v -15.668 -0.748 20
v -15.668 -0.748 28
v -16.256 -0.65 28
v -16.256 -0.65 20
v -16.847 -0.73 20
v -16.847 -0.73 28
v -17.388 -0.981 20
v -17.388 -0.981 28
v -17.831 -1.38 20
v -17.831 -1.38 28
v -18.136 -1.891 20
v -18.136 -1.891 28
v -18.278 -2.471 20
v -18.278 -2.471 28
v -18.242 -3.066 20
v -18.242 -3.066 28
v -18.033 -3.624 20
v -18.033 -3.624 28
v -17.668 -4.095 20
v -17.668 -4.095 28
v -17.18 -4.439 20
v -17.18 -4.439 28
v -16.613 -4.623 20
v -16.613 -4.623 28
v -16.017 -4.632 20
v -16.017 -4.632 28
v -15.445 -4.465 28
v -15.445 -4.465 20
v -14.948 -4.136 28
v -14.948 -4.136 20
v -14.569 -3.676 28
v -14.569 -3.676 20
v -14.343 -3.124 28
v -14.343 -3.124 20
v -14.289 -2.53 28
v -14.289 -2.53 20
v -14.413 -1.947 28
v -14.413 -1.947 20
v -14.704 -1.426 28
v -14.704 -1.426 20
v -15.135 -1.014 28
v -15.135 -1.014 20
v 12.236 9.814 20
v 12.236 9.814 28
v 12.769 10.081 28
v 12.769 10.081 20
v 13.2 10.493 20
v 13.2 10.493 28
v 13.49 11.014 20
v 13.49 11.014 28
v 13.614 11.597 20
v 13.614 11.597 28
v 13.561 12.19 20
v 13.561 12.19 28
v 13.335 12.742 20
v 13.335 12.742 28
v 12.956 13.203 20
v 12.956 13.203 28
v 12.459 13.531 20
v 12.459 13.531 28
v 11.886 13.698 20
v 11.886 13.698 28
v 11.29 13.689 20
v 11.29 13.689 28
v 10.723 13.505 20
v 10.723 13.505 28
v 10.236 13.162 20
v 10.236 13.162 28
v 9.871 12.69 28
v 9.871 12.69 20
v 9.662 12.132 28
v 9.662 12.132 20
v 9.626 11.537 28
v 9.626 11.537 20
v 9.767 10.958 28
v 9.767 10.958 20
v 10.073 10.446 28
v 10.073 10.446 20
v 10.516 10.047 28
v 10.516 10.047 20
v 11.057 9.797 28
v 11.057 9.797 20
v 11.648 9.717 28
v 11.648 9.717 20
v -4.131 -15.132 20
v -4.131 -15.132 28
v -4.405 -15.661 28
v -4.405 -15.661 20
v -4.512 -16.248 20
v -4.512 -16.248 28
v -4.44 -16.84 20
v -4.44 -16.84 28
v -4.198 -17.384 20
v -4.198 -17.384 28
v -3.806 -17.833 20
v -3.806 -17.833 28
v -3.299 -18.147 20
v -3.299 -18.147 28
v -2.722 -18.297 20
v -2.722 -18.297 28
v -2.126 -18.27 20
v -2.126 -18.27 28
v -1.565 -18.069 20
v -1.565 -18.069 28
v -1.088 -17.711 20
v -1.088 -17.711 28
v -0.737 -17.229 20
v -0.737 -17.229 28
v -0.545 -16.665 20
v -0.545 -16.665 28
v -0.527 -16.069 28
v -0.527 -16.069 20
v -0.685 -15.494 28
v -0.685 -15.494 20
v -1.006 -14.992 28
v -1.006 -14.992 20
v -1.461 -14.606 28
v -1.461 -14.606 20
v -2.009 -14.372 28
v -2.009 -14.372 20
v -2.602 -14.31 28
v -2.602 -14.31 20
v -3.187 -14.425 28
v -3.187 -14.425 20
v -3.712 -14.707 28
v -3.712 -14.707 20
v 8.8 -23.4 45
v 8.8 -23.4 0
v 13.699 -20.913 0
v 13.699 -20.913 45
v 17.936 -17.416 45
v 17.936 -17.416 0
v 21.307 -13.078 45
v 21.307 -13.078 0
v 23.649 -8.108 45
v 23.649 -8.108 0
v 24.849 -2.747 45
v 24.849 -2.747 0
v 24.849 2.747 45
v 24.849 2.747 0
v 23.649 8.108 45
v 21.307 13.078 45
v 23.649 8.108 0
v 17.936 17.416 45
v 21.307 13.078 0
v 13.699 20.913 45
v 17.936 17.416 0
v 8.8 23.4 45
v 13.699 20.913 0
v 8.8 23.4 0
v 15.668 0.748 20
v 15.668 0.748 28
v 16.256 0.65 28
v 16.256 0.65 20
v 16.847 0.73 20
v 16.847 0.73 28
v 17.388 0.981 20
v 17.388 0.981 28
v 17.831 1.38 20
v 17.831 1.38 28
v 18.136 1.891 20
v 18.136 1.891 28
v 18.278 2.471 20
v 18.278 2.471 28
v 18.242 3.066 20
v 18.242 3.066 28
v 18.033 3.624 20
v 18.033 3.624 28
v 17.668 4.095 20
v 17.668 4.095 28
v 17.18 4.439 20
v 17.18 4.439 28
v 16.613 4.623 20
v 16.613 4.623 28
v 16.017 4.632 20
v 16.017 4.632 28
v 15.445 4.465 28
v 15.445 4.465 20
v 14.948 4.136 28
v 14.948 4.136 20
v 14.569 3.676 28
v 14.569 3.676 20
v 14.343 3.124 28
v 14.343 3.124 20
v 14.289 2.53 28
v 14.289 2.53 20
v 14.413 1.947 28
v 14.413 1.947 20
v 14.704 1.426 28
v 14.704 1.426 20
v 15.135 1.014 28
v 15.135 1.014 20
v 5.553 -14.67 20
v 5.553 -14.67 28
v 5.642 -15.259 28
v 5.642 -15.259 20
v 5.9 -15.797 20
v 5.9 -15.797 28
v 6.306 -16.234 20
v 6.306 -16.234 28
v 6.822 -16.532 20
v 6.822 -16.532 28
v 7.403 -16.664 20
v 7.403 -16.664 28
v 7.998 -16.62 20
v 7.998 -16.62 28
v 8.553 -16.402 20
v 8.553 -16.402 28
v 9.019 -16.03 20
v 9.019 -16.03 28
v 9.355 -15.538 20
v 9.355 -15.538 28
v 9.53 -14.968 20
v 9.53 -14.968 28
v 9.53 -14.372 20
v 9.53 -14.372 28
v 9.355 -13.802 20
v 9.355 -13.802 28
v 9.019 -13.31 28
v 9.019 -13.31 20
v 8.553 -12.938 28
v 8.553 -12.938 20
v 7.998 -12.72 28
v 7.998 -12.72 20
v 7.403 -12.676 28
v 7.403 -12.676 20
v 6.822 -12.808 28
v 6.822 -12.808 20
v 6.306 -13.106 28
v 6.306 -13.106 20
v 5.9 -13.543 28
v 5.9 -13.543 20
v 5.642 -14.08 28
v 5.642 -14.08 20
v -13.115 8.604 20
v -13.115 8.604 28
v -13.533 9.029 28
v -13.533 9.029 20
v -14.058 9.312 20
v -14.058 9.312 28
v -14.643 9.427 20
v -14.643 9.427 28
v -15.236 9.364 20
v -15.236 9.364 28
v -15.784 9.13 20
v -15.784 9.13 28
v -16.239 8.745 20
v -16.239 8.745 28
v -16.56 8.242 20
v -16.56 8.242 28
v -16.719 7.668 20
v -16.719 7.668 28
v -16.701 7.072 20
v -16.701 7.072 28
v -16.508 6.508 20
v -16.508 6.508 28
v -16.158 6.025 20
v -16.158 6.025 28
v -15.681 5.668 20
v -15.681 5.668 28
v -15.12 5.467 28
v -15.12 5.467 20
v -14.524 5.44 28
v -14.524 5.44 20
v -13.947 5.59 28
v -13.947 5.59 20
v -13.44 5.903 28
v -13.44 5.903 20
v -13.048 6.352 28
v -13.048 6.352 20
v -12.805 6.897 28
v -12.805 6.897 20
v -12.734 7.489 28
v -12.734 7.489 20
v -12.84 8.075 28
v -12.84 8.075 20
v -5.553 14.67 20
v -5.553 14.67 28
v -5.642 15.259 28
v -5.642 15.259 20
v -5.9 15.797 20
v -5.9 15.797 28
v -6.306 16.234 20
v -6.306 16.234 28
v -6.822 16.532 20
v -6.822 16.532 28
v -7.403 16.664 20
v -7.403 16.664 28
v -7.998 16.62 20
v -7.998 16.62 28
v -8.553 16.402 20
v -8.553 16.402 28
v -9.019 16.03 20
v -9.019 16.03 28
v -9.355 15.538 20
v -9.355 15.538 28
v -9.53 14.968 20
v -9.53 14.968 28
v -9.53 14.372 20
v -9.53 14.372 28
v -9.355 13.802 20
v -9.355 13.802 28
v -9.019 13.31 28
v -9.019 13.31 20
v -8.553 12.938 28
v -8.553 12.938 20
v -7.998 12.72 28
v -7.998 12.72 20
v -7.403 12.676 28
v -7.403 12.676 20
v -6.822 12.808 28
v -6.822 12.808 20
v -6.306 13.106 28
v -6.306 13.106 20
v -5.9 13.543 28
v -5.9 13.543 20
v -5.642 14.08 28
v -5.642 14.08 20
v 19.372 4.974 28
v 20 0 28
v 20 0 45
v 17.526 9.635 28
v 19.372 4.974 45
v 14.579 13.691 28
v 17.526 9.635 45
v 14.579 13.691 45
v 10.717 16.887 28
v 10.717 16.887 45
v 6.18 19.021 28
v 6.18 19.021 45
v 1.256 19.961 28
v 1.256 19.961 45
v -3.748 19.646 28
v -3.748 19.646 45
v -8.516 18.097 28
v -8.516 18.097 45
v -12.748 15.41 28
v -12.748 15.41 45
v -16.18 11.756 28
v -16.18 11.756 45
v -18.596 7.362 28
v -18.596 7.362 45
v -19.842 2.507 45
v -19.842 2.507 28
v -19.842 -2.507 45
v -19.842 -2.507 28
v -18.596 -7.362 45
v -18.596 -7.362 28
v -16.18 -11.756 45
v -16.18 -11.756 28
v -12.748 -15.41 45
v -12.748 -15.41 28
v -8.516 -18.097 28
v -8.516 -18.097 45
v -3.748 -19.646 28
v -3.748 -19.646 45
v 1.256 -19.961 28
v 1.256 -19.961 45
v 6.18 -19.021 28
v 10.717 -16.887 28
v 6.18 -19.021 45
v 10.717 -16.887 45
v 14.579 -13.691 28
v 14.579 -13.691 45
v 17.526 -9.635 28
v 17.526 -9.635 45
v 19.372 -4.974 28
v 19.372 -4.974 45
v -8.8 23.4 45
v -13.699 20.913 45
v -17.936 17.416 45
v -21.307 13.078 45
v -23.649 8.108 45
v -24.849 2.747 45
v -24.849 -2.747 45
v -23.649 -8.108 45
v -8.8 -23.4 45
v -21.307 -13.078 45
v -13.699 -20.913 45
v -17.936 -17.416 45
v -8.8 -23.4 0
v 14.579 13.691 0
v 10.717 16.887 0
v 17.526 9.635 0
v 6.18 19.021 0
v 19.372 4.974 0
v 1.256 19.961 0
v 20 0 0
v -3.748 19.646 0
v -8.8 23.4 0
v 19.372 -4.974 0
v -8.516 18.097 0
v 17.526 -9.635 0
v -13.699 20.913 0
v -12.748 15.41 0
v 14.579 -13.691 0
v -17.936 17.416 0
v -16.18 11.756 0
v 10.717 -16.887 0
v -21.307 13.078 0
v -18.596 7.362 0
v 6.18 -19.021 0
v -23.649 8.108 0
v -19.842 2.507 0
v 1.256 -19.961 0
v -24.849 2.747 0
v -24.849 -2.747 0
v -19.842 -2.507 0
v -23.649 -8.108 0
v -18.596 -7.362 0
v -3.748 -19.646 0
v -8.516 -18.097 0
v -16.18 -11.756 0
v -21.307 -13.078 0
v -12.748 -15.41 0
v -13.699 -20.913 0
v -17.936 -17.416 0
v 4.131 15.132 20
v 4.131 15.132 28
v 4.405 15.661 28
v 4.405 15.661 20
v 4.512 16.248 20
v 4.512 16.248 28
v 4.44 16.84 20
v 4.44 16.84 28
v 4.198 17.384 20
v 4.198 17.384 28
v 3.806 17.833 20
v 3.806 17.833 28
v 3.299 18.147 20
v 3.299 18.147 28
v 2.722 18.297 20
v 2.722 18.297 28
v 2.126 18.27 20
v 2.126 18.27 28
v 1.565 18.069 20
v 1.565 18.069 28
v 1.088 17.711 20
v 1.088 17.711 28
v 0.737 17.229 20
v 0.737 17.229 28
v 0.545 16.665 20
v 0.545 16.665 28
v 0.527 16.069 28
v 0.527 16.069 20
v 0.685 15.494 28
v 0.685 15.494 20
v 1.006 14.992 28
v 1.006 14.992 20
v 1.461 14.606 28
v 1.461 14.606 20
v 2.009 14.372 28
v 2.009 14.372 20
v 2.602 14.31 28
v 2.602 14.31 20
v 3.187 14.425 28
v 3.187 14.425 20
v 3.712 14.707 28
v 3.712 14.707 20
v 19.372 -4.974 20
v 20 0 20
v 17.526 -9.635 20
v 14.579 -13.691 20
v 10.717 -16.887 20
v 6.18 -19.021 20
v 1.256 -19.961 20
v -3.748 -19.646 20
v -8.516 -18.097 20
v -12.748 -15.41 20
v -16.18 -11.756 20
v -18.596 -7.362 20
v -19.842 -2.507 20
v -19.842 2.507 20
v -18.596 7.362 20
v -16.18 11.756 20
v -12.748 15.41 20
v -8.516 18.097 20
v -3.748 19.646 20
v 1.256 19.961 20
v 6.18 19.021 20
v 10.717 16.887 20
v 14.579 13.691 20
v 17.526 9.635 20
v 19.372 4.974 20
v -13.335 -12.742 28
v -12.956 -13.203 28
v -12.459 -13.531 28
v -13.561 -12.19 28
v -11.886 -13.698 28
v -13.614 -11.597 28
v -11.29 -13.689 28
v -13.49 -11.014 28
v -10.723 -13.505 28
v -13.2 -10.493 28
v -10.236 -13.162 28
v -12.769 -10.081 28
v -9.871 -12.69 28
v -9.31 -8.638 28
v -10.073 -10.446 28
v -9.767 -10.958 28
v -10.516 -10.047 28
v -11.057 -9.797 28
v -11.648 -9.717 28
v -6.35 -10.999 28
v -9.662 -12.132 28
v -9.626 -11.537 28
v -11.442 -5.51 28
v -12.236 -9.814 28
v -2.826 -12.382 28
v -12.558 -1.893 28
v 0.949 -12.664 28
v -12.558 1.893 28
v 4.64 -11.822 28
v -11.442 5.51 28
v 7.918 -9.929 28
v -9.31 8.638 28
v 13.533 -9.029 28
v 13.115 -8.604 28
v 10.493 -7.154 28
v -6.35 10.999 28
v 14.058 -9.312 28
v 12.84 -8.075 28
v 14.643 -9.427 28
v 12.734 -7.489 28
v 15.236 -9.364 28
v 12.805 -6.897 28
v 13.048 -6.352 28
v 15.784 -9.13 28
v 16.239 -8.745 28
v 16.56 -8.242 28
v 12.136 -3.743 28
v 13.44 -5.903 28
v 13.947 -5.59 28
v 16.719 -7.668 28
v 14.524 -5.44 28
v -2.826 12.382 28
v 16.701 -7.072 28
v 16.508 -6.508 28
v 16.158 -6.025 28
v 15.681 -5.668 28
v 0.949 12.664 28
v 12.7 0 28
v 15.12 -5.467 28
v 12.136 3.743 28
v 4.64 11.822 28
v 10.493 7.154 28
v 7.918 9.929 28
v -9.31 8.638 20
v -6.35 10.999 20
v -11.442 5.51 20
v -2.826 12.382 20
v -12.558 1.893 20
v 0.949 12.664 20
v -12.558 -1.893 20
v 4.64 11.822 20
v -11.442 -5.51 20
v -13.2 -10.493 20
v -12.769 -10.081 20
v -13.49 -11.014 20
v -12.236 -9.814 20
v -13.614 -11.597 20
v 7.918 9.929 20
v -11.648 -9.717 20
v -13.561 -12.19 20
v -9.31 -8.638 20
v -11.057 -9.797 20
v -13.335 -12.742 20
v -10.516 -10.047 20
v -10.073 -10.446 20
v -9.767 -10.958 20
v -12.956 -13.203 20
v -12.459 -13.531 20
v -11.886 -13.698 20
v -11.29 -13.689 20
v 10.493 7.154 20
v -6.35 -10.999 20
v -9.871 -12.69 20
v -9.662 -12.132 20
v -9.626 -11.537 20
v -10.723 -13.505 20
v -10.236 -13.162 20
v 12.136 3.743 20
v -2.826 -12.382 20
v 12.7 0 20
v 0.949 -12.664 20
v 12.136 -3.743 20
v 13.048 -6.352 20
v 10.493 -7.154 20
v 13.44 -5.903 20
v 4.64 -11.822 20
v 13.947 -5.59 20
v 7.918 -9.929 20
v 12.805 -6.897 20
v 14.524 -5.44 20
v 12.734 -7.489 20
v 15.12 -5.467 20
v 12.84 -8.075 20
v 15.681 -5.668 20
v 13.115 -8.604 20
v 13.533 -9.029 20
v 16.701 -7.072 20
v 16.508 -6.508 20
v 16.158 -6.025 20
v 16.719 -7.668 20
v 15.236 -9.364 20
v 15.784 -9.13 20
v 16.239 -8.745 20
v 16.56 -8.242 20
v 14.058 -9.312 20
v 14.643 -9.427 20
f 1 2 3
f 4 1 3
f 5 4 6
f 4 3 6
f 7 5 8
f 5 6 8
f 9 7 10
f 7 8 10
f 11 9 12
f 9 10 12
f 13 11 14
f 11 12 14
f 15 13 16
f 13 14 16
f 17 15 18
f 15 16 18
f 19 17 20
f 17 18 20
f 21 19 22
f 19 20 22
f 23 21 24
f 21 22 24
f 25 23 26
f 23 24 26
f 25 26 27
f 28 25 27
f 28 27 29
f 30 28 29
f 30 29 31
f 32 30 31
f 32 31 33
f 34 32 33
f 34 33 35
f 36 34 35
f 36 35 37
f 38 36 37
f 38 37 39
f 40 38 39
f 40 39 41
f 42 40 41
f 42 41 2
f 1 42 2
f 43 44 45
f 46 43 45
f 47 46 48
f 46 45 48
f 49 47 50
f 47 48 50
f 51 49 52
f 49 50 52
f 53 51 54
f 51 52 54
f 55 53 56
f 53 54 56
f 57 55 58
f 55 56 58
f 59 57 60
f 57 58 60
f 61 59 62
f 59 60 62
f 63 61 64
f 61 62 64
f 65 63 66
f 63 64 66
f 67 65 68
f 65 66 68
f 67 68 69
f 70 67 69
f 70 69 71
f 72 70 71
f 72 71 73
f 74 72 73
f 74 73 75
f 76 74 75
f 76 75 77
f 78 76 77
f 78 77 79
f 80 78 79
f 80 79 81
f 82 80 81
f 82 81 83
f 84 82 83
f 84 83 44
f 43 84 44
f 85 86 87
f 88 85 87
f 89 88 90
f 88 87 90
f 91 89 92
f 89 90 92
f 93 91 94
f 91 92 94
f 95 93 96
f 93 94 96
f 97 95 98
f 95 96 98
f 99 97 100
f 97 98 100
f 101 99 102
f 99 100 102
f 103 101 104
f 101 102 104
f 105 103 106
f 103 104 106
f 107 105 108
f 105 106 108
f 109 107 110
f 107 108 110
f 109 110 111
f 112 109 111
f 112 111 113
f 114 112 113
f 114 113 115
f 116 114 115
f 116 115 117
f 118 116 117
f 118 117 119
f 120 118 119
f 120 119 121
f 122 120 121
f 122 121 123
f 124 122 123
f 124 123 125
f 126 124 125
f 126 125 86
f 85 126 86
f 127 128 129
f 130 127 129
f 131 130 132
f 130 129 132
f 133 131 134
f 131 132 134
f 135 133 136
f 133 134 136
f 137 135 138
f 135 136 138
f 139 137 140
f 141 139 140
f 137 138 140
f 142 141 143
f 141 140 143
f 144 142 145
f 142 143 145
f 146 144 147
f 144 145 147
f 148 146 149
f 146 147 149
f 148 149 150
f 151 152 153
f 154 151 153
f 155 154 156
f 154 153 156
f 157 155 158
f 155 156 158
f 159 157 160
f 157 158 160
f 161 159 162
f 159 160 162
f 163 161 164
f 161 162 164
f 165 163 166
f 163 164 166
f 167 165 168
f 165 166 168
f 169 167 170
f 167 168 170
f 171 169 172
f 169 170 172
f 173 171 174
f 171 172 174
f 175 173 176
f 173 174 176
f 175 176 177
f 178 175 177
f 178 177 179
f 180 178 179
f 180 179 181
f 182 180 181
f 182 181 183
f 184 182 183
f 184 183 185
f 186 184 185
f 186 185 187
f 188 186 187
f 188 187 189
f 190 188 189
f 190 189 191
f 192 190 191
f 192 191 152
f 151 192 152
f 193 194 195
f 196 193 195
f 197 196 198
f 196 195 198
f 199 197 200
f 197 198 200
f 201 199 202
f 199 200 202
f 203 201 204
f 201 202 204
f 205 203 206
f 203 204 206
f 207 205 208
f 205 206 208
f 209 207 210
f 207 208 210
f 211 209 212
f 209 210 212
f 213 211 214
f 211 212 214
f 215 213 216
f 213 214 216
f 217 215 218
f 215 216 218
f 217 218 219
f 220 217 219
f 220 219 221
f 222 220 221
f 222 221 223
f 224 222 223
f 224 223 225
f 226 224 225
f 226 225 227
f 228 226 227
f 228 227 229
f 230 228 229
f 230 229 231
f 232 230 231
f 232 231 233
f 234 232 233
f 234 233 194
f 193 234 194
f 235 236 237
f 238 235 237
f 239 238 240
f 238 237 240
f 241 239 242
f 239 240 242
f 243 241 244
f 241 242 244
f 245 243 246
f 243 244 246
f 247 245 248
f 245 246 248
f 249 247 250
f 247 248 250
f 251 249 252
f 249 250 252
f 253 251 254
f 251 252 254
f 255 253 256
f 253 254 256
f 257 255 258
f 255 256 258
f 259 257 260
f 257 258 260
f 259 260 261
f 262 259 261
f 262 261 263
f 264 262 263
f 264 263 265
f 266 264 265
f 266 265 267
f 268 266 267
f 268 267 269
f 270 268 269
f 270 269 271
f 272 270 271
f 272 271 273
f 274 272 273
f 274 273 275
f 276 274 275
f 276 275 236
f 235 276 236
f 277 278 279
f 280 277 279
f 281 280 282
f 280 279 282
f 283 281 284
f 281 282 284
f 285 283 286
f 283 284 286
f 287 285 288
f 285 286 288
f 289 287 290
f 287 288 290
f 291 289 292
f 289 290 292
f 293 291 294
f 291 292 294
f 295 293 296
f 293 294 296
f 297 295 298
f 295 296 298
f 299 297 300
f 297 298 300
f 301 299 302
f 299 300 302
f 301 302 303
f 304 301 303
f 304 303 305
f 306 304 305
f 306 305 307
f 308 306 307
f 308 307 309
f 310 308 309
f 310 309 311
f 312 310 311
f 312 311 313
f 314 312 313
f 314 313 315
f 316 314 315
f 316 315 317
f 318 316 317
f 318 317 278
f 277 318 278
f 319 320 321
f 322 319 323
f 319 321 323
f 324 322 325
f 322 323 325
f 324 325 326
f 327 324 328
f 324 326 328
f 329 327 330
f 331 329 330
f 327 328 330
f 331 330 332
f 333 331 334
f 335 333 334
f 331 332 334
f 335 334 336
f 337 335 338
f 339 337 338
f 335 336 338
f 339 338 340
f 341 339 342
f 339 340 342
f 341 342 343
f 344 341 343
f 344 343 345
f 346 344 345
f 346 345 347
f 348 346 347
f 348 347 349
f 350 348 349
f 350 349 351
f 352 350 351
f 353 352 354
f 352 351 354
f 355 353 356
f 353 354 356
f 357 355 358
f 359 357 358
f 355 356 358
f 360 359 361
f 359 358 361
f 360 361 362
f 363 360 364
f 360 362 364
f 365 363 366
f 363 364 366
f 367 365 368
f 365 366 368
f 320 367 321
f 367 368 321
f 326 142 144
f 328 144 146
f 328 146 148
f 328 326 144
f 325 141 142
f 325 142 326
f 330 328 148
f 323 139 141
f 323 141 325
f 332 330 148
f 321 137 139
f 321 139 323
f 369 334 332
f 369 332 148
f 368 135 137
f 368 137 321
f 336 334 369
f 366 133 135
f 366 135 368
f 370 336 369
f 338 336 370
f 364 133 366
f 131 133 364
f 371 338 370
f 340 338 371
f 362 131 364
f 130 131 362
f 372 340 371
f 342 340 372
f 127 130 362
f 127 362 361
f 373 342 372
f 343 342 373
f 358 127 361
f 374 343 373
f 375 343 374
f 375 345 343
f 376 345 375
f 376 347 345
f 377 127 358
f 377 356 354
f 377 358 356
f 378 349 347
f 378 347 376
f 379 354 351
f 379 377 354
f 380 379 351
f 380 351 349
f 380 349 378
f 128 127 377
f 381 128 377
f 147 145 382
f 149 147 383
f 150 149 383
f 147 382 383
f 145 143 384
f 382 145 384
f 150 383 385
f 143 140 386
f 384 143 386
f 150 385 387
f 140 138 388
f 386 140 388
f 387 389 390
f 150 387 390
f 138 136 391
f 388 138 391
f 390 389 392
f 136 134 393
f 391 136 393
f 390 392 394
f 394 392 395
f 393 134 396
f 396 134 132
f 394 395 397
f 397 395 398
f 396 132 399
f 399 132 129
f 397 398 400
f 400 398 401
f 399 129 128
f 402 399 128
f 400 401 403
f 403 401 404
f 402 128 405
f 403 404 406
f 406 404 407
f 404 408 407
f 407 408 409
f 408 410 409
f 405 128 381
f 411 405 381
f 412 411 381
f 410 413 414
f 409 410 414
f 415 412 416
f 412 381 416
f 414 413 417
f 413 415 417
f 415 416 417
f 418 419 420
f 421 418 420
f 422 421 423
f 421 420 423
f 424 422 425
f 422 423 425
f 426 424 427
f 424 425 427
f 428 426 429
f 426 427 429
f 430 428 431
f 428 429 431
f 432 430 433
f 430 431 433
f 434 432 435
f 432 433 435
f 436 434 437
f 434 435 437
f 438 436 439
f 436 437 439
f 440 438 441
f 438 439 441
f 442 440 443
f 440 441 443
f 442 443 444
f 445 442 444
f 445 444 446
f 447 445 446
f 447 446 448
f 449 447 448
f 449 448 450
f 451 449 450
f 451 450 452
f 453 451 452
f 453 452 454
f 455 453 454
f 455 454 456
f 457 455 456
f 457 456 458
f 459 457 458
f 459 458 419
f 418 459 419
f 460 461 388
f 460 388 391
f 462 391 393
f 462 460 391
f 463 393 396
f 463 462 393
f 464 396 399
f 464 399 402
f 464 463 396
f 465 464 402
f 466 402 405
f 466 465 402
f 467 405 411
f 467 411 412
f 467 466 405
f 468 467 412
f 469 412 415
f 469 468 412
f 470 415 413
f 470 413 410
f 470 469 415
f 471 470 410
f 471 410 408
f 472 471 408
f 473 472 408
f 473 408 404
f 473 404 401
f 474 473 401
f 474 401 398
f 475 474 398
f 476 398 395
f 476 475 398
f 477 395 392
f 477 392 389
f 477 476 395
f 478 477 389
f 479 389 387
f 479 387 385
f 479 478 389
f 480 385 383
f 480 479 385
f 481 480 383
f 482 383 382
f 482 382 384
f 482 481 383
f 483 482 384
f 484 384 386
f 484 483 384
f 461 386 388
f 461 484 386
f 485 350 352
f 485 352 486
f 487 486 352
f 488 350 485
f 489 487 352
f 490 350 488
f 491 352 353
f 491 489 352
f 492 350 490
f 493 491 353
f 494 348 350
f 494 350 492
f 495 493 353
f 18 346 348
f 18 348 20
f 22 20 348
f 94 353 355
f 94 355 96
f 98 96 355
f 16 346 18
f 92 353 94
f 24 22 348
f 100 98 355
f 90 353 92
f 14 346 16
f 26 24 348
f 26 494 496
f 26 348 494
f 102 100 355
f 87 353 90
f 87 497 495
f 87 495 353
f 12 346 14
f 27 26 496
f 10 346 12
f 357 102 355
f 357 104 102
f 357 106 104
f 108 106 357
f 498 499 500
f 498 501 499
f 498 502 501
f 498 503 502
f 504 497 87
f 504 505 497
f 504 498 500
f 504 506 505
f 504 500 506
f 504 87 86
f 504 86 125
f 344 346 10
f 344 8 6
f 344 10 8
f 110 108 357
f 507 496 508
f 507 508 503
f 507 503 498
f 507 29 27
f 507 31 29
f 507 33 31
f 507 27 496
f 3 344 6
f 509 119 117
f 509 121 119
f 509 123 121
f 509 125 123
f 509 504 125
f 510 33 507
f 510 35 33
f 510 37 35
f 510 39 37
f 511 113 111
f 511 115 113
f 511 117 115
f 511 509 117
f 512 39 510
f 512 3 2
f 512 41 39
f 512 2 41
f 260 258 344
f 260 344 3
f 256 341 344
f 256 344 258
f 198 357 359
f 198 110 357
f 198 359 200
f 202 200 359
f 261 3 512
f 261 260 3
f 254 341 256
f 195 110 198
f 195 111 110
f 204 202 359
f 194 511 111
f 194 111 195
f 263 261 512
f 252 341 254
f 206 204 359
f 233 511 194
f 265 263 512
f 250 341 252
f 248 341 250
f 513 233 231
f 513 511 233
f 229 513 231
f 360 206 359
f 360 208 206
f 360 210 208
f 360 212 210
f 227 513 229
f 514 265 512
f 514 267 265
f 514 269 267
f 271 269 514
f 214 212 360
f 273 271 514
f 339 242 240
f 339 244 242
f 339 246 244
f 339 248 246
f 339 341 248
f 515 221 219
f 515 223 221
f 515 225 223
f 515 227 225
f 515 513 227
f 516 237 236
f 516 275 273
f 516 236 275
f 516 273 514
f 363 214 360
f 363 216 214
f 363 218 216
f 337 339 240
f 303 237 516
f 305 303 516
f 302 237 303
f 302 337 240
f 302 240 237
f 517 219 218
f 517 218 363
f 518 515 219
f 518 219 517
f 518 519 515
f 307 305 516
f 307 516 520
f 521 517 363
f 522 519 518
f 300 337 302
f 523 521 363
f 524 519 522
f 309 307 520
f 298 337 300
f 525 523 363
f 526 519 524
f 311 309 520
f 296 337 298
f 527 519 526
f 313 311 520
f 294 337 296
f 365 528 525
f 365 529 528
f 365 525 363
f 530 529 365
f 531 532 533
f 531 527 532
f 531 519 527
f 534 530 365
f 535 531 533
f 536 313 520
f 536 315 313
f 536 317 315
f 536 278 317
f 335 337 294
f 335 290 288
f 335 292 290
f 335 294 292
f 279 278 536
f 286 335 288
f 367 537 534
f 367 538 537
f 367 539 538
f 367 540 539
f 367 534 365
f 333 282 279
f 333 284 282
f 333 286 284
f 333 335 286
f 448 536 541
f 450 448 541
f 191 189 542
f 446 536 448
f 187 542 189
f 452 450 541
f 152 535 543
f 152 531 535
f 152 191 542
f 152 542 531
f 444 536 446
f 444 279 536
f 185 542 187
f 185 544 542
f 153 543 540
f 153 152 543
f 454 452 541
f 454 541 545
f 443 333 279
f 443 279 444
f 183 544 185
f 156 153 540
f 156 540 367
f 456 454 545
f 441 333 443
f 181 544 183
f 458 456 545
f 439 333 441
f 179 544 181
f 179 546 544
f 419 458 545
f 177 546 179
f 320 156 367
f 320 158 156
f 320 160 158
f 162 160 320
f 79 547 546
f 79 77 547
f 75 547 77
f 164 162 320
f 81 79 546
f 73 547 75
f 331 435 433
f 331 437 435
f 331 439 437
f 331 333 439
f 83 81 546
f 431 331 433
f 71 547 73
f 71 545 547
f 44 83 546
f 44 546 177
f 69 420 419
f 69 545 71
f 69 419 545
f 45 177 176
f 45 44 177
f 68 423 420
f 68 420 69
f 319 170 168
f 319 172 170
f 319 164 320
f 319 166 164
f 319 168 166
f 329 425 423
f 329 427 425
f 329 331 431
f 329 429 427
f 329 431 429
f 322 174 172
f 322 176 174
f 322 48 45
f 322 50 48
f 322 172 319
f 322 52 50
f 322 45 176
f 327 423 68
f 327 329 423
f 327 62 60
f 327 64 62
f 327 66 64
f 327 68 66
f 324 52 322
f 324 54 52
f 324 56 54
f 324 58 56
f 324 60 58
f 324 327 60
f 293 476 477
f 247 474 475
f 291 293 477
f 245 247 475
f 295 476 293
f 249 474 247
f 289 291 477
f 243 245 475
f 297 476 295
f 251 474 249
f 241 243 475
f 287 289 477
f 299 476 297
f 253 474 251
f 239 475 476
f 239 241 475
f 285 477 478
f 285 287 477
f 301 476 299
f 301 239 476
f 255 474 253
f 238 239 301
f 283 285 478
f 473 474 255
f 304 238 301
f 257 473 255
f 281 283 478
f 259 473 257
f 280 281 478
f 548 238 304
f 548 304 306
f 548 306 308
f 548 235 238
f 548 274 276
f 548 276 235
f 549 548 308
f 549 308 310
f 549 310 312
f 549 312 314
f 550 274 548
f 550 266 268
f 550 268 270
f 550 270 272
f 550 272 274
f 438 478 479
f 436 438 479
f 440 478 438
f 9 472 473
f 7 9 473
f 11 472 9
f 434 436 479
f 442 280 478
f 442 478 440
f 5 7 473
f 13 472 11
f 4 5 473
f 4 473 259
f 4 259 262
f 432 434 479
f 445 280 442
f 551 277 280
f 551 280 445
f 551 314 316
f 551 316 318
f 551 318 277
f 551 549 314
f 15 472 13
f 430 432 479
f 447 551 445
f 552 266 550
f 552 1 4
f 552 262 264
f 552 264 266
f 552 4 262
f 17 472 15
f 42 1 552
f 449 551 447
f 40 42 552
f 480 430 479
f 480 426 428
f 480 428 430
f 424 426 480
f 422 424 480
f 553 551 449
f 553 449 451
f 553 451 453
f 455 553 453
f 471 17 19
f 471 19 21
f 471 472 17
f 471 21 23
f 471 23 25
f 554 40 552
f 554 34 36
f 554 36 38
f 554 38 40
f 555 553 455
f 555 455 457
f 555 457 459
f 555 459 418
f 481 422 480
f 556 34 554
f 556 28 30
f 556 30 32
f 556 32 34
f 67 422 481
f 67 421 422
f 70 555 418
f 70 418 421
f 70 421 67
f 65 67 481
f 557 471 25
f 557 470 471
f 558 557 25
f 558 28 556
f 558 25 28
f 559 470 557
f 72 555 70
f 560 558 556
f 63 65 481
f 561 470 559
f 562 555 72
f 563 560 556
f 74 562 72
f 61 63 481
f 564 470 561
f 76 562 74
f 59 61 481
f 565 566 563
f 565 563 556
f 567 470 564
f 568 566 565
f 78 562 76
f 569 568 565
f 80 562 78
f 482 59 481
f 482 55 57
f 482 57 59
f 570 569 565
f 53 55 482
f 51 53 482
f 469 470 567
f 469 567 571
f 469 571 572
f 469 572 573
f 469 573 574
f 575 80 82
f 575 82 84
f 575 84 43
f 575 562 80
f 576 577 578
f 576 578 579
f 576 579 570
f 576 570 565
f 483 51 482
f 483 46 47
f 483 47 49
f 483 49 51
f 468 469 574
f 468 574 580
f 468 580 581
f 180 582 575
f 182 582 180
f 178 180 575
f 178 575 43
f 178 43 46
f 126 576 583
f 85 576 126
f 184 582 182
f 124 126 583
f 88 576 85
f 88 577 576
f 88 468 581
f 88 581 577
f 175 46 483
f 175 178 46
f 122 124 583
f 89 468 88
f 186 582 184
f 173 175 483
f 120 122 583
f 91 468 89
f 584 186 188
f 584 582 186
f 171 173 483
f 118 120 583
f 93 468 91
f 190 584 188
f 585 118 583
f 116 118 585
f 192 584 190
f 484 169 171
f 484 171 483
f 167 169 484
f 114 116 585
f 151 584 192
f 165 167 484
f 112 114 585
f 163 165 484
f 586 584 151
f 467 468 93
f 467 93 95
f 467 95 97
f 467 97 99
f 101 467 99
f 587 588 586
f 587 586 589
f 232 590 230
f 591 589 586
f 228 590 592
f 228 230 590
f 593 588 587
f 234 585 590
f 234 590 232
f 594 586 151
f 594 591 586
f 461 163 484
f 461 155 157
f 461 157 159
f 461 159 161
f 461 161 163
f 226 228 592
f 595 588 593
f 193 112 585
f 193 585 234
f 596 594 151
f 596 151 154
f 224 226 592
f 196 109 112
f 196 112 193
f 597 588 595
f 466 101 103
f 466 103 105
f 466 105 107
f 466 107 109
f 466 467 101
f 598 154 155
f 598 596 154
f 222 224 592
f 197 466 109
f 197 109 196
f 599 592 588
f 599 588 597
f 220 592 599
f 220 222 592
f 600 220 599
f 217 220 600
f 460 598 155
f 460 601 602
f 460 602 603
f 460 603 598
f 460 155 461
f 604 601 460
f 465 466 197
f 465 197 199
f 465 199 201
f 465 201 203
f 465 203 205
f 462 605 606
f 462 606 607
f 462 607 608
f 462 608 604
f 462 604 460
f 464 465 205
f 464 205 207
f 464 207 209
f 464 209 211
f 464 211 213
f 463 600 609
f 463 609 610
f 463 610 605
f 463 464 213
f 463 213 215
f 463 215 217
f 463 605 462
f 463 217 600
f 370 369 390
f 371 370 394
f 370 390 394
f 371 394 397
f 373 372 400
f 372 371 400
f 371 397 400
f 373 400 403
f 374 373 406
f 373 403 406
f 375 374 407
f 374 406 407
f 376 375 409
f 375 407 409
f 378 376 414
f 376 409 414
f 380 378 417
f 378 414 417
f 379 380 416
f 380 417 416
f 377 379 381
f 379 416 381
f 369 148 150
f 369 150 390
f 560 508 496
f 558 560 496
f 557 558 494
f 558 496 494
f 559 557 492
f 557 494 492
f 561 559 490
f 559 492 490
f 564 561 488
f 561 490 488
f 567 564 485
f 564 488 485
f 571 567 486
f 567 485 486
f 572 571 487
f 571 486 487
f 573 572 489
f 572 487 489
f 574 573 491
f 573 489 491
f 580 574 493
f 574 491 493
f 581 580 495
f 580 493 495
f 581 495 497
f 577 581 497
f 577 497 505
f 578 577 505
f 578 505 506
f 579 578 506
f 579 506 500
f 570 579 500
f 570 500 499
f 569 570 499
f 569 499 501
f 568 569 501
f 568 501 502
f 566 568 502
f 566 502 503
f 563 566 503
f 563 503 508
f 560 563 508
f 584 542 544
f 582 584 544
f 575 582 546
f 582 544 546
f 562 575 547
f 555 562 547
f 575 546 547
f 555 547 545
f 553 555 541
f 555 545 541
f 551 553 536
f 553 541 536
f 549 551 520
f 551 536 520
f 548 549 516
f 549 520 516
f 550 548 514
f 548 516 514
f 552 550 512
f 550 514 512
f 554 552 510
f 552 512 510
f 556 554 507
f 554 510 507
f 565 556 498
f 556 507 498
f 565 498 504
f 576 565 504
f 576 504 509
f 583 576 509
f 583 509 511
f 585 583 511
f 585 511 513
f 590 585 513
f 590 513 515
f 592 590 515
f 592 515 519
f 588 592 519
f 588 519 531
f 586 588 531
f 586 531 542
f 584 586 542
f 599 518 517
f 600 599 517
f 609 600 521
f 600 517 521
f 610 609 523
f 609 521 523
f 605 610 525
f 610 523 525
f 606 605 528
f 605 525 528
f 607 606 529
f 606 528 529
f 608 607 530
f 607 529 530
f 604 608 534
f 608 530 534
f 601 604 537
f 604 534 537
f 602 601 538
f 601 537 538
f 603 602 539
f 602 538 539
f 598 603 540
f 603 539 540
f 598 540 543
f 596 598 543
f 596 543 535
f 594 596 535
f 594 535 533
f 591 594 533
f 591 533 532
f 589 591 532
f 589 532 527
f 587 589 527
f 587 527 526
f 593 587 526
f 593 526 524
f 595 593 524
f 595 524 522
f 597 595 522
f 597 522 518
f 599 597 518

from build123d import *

# Parameters (mm, degrees)
SKETCH1_R           = 25
BOSS_EXTRUDE1_DEPTH = 45
SKETCH2_R           = 20
CUT_EXTRUDE1_DEPTH  = 17
SKETCH3_R           = 12.7
CUT_EXTRUDE2_DEPTH  = 18
SKETCH4_R           = 2
CUT_EXTRUDE3_DEPTH  = 46.099889135
CIRPATTERN1_COUNT   = 10
CUT_EXTRUDE4_START  = -20
SKETCH5_R           = 20
CUT_EXTRUDE4_DEPTH  = 20
CUT_EXTRUDE5_DEPTH  = 58.227615711


with BuildPart() as part:
    # Sketch1 → Boss-Extrude1 (new body)
    with BuildSketch(Plane.XY):
        with Locations(Location((0, 0, 0), (0, 0, 180))):
            Circle(SKETCH1_R)
    extrude(amount=BOSS_EXTRUDE1_DEPTH)

    # Sketch2 → Cut-Extrude1 (cut)
    with BuildSketch(Plane.XY.offset(45)):
        Circle(SKETCH2_R)
    extrude(amount=-CUT_EXTRUDE1_DEPTH, mode=Mode.SUBTRACT)

    # Sketch3 → Cut-Extrude2 (cut)
    with BuildSketch(Plane.XY.offset(28)):
        Circle(SKETCH3_R)
    extrude(amount=-CUT_EXTRUDE2_DEPTH, mode=Mode.SUBTRACT)

    # Sketch4 → Cut-Extrude3 (cut, through all)
    with BuildSketch(Plane.XY.offset(28)):
        with Locations((-7.552723676, 14.669913602)):
            Circle(SKETCH4_R)
    cut_extrude3 = extrude(amount=-CUT_EXTRUDE3_DEPTH, mode=Mode.SUBTRACT)

    # CirPattern1: Cut-Extrude3 ×10 about axis
    cirpattern1_axis = Axis((0, 0, 0), (0, 0, 1))
    for i in range(1, CIRPATTERN1_COUNT):
        add(cut_extrude3.rotate(cirpattern1_axis, i * 360 / CIRPATTERN1_COUNT), mode=Mode.SUBTRACT)

    # Sketch5 → Cut-Extrude4 (cut)
    with BuildSketch(Plane(origin=(0, 0, 0), x_dir=(-1, 0, 0), z_dir=(0, 0, -1)).offset(CUT_EXTRUDE4_START)):
        with Locations(Location((0, 0, 0), (0, 0, 180))):
            Circle(SKETCH5_R)
    extrude(amount=CUT_EXTRUDE4_DEPTH, mode=Mode.SUBTRACT)

    # Sketch6 → Cut-Extrude5 (cut, through all)
    with BuildSketch(Plane(origin=(0, 0, 0), x_dir=(-1, 0, 0), z_dir=(0, 0, -1))):
        with BuildLine():
            Line((-8.8, 23.4), (8.8, 23.4))
            ThreePointArc((8.8, 23.4), (0, 25), (-8.8, 23.4))
        make_face()
        with BuildLine():
            Line((-8.8, -23.4), (8.8, -23.4))
            ThreePointArc((8.8, -23.4), (0, -25), (-8.8, -23.4))
        make_face()
    extrude(amount=-CUT_EXTRUDE5_DEPTH, mode=Mode.SUBTRACT)


solid = part.part
